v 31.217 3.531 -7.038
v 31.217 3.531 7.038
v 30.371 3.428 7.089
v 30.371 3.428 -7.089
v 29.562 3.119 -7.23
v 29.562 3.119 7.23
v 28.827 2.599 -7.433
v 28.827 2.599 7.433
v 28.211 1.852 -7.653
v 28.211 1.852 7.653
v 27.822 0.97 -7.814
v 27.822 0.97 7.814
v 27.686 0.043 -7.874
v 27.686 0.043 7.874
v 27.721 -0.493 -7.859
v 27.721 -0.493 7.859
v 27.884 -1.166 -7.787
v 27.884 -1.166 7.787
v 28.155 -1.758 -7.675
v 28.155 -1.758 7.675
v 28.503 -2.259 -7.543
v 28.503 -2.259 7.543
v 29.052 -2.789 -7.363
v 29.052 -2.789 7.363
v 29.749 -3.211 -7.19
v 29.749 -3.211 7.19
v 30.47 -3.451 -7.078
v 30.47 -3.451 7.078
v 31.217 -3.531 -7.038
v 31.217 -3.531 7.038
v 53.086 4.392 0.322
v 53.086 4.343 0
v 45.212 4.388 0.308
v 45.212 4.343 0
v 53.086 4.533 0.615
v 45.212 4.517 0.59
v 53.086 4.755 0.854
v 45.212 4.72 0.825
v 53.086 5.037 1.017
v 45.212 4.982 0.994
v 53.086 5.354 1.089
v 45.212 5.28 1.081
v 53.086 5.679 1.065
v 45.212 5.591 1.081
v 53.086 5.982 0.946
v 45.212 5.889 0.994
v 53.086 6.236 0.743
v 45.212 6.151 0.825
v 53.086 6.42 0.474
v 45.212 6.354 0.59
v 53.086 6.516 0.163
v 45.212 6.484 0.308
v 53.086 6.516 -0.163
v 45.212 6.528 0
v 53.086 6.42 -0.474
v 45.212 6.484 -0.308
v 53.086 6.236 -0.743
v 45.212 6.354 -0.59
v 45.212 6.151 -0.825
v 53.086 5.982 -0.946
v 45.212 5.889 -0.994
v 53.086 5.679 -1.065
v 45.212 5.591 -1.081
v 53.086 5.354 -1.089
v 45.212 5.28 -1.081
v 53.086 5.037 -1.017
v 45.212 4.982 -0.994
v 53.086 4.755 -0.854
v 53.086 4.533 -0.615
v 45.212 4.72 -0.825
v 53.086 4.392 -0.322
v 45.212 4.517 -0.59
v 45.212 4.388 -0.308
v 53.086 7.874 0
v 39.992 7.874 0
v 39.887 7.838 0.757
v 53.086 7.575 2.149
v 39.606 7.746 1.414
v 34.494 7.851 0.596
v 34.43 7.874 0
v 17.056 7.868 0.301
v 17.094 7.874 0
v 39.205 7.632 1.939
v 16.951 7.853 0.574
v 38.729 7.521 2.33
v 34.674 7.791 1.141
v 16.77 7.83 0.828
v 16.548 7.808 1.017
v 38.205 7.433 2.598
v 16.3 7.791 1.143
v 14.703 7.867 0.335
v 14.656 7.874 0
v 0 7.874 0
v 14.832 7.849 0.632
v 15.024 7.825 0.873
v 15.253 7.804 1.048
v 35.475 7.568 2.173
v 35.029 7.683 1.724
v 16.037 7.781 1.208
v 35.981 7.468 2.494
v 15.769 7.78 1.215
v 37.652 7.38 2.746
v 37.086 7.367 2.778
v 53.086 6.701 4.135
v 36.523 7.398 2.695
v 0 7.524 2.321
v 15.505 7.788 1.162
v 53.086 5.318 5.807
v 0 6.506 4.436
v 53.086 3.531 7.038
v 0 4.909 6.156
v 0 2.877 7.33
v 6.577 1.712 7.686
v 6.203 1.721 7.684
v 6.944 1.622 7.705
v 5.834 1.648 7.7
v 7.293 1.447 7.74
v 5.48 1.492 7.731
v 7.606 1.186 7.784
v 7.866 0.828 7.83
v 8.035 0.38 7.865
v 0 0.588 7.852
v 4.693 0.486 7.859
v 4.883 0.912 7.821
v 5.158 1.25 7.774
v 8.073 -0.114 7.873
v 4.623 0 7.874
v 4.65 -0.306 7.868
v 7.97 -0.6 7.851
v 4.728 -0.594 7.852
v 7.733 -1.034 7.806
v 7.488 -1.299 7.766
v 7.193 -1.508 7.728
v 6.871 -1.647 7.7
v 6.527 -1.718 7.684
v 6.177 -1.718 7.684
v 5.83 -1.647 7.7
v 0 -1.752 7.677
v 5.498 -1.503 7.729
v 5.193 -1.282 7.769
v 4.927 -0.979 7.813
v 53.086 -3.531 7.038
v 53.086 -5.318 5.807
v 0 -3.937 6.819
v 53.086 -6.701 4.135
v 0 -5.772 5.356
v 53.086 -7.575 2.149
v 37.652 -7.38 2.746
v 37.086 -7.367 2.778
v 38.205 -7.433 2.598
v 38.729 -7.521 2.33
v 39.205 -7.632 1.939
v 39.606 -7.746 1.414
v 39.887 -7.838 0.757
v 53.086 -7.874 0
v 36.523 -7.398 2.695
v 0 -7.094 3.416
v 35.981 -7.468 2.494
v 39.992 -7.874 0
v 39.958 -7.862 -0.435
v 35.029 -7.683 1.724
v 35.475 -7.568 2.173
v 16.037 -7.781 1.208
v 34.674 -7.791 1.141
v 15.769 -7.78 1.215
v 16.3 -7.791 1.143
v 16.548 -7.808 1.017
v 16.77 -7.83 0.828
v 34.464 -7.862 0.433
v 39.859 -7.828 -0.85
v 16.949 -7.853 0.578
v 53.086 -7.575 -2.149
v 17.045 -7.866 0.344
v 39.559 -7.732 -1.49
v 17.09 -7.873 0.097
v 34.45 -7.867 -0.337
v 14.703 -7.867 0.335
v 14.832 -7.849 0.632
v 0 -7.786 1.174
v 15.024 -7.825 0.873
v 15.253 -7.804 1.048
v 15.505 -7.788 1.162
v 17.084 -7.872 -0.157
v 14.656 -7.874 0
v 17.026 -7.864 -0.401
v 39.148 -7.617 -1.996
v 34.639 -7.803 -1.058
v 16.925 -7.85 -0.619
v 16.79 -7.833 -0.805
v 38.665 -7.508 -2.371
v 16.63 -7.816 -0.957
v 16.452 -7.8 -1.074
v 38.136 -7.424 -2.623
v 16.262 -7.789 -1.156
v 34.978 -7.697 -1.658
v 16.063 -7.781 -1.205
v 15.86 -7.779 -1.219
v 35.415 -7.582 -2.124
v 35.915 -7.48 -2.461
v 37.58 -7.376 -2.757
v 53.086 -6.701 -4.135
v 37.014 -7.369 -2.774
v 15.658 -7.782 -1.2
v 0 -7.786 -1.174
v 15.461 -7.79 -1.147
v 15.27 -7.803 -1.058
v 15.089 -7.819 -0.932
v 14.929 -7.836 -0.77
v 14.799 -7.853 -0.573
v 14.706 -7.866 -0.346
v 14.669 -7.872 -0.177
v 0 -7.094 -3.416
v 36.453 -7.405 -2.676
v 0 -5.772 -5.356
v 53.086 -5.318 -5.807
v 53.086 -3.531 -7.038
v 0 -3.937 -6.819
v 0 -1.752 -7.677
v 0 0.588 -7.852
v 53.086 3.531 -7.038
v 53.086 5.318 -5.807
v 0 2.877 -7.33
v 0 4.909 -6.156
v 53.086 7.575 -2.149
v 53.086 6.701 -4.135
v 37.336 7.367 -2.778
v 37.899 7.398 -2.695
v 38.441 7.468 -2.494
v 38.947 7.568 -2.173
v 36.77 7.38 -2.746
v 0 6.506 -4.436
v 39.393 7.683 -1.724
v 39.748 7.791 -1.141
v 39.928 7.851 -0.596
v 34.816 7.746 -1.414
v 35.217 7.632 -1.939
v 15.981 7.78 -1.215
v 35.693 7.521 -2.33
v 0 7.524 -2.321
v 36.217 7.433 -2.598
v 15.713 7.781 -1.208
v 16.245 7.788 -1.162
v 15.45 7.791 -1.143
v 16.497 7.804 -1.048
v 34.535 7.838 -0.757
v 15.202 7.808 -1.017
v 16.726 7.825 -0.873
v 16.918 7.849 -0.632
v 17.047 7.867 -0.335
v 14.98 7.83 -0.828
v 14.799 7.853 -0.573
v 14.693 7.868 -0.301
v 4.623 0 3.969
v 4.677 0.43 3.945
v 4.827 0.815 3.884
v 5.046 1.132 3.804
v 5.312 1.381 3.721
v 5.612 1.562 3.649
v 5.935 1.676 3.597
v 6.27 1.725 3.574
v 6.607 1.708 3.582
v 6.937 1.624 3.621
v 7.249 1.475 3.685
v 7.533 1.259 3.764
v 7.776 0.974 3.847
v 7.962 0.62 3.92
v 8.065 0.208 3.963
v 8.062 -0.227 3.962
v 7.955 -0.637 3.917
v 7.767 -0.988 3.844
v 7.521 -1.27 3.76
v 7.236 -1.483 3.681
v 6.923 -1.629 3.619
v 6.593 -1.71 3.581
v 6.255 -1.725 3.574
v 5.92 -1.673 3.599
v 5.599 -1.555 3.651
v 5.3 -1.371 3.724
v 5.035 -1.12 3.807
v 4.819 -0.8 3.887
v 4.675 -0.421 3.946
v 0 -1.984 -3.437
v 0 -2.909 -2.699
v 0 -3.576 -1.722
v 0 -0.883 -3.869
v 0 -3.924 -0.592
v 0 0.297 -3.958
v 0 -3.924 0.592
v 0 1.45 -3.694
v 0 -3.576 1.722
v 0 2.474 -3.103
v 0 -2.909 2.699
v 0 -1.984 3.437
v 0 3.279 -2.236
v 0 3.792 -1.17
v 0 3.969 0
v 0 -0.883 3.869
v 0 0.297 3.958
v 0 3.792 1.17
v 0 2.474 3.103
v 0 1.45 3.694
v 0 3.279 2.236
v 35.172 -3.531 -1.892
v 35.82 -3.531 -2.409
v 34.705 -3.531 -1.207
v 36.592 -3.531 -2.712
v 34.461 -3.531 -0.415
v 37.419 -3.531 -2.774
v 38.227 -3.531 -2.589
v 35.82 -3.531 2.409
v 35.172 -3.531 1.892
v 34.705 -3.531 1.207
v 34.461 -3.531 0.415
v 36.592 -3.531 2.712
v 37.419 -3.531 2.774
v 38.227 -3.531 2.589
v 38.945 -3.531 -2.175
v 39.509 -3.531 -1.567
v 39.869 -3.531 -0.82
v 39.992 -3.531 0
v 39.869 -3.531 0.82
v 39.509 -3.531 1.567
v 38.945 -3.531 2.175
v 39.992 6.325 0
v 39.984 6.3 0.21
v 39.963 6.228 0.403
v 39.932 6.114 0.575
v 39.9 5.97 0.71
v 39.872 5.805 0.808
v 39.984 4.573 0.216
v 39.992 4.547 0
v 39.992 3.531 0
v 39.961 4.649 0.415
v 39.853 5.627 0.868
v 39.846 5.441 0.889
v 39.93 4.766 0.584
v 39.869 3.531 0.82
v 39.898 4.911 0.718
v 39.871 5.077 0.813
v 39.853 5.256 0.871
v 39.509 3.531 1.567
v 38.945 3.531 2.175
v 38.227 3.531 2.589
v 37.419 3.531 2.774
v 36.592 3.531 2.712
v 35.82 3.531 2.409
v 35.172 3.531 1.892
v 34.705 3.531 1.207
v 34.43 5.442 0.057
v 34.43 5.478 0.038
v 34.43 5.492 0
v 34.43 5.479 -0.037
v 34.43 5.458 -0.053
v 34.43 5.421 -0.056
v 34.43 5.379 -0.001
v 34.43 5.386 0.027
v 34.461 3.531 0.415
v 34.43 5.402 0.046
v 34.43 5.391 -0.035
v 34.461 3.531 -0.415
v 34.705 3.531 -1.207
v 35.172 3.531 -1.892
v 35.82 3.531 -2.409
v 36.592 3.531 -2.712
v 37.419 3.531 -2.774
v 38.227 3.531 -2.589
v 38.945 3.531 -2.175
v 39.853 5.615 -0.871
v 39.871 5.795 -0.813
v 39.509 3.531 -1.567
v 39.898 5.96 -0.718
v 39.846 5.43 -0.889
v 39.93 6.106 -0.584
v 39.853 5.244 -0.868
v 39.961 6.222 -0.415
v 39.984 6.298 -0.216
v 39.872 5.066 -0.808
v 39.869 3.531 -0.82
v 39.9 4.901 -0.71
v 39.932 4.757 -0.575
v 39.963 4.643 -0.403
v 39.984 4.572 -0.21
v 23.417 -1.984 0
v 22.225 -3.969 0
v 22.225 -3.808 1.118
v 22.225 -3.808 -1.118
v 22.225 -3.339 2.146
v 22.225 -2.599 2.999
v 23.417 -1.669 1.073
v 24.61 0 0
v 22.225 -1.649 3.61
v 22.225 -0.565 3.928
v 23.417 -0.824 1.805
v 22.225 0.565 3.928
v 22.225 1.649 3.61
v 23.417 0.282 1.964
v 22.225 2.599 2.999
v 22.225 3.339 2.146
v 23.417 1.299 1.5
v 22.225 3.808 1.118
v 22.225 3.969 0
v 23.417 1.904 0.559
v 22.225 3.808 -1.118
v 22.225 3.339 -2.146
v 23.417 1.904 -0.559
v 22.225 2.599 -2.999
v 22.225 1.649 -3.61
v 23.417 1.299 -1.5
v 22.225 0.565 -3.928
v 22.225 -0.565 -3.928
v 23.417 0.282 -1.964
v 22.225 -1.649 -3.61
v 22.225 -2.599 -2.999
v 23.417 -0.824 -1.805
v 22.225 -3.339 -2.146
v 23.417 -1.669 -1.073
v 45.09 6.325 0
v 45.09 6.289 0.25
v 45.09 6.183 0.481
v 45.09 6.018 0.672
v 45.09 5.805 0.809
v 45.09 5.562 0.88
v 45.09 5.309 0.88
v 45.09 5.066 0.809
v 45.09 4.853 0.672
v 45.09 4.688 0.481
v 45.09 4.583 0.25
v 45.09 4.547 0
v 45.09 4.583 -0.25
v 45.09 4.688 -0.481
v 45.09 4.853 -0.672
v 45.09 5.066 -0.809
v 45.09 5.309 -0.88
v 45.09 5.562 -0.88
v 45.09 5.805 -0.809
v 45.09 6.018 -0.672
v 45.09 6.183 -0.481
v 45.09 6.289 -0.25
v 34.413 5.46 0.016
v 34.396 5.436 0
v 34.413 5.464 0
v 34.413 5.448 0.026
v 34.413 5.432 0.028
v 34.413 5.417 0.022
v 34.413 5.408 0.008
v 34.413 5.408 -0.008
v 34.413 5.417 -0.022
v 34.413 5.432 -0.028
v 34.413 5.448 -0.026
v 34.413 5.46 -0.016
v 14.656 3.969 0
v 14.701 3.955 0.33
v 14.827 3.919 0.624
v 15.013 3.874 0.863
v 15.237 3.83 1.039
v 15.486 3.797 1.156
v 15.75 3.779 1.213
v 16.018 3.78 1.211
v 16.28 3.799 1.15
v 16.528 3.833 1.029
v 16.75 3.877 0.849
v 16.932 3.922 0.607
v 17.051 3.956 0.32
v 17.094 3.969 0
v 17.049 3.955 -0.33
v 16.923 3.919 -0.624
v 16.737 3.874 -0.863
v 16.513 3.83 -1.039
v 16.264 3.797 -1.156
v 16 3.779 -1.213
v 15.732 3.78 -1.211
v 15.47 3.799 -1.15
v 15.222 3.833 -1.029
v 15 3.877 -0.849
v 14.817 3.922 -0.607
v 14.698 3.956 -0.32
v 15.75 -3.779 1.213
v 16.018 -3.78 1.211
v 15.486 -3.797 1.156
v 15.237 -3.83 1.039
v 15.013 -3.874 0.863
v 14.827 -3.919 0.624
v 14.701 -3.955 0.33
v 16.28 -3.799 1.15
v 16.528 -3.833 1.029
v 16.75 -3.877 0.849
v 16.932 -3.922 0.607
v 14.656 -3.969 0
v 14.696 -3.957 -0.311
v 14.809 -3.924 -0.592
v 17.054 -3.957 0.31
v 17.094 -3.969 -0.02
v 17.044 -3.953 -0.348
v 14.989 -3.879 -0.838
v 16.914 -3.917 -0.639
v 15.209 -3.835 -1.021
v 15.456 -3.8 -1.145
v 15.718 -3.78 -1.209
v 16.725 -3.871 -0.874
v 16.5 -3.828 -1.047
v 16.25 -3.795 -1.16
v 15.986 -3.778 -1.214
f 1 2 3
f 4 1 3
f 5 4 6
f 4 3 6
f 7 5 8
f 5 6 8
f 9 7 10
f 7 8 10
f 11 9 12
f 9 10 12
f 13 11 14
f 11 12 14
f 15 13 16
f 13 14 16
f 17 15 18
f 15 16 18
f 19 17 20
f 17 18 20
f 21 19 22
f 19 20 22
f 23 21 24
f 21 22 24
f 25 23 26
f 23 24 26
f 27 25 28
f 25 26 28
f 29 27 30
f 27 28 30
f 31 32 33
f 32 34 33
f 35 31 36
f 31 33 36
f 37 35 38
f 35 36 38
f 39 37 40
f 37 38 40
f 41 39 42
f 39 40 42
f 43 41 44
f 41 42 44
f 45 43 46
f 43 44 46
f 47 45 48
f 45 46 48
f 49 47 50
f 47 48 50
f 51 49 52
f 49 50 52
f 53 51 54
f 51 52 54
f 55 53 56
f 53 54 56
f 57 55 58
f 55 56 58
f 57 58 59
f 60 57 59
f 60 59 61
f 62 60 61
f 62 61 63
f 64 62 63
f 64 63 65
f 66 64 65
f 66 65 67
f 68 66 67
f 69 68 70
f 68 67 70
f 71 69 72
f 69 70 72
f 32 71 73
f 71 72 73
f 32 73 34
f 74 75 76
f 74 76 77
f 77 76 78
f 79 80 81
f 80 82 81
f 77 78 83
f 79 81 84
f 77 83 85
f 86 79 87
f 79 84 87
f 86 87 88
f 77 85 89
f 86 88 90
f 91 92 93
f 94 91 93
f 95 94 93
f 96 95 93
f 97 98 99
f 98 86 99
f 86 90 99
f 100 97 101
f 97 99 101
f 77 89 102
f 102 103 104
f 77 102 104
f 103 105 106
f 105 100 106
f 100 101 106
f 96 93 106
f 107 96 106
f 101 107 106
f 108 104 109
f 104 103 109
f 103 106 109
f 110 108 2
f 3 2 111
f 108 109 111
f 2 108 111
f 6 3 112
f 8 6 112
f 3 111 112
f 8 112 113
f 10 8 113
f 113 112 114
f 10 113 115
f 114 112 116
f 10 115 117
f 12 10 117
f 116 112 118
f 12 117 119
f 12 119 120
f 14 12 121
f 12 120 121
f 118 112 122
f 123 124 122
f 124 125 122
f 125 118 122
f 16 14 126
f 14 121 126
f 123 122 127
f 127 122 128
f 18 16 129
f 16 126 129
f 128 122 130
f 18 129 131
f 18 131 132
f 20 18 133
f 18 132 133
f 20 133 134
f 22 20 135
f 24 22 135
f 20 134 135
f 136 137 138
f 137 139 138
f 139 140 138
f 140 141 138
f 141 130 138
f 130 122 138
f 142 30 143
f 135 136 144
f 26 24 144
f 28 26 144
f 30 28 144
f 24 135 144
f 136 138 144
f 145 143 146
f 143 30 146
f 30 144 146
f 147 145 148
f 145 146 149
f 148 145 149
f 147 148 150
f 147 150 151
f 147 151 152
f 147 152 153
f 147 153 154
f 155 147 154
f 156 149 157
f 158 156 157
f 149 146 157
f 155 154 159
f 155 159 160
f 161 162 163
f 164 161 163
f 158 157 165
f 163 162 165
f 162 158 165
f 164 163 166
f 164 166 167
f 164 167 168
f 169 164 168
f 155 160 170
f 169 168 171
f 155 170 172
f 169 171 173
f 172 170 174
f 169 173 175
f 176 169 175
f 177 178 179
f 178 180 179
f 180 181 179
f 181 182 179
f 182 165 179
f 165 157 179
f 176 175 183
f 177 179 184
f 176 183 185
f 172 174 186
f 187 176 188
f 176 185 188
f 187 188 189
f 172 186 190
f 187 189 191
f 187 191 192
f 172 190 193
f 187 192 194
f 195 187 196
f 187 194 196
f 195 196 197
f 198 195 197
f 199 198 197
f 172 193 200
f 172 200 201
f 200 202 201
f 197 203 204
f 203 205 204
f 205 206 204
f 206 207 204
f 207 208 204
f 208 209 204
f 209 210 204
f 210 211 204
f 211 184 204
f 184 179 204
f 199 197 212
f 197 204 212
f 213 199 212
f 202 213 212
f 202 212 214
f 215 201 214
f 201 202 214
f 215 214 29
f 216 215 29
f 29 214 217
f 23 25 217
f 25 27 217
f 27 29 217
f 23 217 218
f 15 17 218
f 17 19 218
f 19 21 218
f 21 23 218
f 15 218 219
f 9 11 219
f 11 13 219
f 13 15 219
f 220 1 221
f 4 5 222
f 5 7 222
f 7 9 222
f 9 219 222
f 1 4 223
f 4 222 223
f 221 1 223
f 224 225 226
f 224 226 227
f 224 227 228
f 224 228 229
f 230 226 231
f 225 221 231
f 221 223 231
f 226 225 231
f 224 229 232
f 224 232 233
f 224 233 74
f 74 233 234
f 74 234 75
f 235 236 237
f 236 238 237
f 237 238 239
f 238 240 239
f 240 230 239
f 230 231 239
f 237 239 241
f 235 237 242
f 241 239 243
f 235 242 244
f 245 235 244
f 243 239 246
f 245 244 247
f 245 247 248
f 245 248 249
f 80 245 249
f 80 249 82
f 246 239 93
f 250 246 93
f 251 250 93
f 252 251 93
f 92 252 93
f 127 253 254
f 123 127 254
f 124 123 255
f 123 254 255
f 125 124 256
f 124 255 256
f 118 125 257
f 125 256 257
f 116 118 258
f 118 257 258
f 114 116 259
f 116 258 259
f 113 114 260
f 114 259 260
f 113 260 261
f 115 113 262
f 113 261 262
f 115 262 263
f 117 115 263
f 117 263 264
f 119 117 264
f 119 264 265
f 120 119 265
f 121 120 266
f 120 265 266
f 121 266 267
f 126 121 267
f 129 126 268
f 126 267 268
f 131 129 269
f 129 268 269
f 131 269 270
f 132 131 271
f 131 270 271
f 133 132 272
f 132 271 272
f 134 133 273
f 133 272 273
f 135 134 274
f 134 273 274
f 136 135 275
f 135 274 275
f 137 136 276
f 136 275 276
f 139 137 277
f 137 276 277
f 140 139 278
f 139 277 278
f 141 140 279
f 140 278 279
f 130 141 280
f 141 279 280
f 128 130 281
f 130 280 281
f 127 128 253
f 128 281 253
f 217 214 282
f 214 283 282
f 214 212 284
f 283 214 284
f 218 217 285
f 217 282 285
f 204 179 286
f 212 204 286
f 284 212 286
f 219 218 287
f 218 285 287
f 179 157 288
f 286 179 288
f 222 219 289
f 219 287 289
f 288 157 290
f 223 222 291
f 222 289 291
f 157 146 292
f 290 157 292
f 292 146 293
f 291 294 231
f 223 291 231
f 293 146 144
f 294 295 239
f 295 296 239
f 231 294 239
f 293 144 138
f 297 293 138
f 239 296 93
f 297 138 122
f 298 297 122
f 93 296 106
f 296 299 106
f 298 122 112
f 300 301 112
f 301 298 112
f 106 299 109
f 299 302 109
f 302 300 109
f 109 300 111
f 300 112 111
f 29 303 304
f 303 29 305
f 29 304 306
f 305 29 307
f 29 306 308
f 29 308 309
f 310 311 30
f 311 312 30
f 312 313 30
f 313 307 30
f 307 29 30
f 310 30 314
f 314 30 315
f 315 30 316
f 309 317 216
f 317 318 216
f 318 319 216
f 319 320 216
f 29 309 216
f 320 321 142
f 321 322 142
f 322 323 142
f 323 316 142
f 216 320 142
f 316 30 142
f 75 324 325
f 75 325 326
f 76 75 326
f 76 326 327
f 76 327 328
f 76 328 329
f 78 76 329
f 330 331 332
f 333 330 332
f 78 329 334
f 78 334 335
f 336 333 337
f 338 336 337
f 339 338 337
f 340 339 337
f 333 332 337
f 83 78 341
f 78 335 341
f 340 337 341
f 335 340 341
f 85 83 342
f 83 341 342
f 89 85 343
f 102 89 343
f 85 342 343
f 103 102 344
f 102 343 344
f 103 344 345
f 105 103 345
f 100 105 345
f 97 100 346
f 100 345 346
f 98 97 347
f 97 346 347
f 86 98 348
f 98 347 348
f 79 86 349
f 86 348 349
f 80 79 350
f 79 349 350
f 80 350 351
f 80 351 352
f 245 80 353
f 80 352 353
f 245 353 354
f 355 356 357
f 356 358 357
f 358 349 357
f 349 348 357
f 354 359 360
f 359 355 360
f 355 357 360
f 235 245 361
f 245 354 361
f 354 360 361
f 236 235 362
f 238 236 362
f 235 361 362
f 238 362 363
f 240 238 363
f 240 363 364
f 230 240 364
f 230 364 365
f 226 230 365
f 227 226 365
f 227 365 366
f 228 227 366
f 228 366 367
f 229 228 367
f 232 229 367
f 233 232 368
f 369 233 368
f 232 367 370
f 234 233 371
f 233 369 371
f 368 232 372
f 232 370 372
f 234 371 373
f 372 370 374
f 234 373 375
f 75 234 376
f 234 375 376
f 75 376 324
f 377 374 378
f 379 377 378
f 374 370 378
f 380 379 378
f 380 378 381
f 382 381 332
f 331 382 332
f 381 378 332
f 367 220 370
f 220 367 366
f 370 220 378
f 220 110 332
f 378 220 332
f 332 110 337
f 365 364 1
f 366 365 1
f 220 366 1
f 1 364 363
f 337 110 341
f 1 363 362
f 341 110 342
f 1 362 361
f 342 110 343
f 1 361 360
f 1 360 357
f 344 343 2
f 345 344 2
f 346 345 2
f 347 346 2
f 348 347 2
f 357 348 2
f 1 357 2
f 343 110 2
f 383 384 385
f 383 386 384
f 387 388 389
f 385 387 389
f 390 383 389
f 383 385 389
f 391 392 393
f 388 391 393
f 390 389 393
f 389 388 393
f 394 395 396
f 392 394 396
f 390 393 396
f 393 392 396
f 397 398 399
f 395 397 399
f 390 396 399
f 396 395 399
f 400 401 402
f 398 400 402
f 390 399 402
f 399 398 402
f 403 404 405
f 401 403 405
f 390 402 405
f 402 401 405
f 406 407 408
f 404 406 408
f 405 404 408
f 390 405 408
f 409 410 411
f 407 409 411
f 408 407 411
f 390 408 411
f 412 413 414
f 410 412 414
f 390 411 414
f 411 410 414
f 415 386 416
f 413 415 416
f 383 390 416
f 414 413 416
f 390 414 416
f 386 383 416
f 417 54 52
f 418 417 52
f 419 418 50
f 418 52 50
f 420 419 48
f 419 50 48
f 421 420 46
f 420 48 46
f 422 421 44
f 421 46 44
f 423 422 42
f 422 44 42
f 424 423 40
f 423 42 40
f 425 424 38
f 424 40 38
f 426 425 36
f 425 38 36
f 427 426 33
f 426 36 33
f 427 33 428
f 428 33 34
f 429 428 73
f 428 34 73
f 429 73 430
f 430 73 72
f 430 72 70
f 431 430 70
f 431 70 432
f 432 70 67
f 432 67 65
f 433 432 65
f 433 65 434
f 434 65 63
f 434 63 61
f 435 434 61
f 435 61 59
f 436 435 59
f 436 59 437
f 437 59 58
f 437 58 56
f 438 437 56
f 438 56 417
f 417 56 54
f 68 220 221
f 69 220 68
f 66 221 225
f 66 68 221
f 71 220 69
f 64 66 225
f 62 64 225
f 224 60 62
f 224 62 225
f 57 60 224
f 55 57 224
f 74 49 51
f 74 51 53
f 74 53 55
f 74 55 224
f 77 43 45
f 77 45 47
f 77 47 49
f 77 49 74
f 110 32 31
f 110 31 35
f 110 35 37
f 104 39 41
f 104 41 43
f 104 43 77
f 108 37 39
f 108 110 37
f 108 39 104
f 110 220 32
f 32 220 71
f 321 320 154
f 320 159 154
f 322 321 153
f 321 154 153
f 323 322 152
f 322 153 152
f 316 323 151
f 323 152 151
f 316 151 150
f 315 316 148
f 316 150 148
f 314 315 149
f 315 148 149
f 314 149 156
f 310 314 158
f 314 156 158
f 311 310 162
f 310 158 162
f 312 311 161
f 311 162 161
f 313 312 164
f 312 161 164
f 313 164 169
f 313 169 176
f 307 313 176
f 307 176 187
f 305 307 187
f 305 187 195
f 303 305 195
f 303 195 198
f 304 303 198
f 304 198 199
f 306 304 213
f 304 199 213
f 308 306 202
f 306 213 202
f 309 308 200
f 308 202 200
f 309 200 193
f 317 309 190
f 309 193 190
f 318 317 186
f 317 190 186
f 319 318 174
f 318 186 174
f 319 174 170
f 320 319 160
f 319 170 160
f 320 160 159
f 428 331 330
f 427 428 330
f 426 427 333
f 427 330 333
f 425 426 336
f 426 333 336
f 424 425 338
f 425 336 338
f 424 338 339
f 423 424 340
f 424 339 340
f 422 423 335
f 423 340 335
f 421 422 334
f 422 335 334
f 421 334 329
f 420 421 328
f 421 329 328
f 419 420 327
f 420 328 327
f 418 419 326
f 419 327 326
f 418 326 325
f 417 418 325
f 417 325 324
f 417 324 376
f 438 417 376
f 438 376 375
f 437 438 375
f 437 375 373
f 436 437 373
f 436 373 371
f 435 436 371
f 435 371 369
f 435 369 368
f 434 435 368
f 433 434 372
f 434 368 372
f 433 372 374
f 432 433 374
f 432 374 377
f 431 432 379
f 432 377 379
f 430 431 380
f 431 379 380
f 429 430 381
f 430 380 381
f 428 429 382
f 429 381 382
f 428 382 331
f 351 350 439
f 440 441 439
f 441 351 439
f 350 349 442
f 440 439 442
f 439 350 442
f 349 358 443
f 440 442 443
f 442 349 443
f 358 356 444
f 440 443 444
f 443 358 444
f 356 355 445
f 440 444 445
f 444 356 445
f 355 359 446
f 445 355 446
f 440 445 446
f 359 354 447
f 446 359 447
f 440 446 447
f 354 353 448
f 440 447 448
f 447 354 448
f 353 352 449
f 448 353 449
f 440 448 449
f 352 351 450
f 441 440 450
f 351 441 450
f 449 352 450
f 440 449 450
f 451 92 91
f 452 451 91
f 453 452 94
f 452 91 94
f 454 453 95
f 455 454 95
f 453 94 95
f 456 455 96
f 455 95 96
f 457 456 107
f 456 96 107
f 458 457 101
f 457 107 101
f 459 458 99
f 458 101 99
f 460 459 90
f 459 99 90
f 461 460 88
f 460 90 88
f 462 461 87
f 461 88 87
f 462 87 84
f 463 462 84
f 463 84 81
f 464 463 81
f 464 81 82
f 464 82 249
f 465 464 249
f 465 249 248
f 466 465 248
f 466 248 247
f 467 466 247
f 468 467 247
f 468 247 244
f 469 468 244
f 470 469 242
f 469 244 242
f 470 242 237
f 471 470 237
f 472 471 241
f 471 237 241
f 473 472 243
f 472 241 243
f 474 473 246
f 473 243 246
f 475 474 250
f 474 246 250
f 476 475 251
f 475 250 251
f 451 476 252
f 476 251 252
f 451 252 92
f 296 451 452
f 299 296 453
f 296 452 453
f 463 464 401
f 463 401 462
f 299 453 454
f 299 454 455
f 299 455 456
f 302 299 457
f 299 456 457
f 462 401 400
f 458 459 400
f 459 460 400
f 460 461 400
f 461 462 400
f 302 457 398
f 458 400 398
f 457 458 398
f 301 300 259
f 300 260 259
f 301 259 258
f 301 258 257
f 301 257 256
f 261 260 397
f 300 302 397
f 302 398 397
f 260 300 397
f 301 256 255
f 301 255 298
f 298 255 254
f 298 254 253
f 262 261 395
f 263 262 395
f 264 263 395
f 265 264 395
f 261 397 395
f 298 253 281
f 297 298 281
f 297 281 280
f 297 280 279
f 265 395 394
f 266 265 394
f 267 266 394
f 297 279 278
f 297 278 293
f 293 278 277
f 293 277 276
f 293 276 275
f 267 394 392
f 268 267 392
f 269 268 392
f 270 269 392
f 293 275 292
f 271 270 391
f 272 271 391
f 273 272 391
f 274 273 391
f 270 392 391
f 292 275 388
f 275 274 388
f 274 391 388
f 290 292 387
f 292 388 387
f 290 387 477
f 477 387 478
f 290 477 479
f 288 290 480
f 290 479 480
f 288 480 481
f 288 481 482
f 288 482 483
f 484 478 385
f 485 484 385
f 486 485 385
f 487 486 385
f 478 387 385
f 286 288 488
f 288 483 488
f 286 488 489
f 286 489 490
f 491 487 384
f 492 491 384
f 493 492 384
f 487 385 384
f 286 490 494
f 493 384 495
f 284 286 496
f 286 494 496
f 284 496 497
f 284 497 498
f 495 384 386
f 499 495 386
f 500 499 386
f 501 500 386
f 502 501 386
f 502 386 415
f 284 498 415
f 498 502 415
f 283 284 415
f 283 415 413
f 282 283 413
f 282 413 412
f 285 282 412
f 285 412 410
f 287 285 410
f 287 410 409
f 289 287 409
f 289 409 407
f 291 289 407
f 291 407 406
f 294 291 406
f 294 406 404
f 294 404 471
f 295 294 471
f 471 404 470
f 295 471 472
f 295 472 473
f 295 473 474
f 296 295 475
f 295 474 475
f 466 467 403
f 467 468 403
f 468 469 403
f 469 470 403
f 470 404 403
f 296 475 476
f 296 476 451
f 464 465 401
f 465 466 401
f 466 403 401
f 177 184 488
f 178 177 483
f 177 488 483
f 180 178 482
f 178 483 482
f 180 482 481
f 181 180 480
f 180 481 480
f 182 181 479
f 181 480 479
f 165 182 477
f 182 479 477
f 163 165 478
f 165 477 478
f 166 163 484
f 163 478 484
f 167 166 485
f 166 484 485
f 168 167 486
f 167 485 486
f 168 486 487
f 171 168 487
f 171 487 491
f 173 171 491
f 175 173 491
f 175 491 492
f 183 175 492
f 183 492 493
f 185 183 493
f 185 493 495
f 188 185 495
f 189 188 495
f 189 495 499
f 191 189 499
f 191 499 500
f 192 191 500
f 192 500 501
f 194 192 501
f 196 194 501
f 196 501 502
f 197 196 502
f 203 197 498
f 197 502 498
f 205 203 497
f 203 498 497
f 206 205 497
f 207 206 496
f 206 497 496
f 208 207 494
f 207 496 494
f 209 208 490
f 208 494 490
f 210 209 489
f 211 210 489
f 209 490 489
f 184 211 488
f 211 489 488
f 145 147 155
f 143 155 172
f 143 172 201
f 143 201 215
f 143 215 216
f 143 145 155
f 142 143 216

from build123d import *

# Parameters (mm, degrees)
F0_R      = 7.874
F1_DEPTH  = 53.086
F3_DEPTH  = 12.7
F6_D      = 3.4544
F6_DEPTH  = 7.71525
F6_START  = 4.2557702
F6_TIP    = 1.0378064612
F8_D      = 7.9375
F8_DEPTH  = 22.225
F8_TIP    = 2.3846655818
F9_R      = 2.7813
F10_DEPTH = 12.7
F13_D     = 2.4384
F15_D     = 2.1844
F15_DEPTH = 7.874
F15_TIP   = 0.6562599681
F16_D     = 1.778
F16_DEPTH = 10.16
F16_START = 7.9960949
F16_TIP   = 0.5341650903


with BuildPart() as f1:
    # F0 (on Right) → F1 (new body)
    with BuildSketch(Plane.YZ):
        Circle(F0_R)
    extrude(amount=F1_DEPTH)

    # F2 (on Top) → F3 (cut, symmetric)
    with BuildSketch(Plane.XY):
        with BuildLine():
            ThreePointArc((31.2166, 3.5306), (27.686, 0), (31.2166, -3.5306))
            Line((31.2166, -3.5306), (67.7581354976, -3.5306))
            Line((67.7581354976, -3.5306), (67.7581354976, 3.5306))
            Line((67.7581354976, 3.5306), (31.2166, 3.5306))
        make_face()
    extrude(amount=F3_DEPTH, both=True, mode=Mode.SUBTRACT)

    # F6
    # its depths count from where the whole tool has entered the part; down to there all is cleared
    with Locations(Plane.XY.offset(11.938).offset(-F6_START)):
        with Locations((6.35, 0)):
            Hole(F6_D / 2, depth=F6_DEPTH)
            with Locations((0, 0, -(F6_DEPTH + F6_TIP / 2))):  # 118° drill point
                Cone(0, F6_D / 2, F6_TIP, mode=Mode.SUBTRACT)

    # F8
    with Locations(Plane(origin=(0, 0, 0), x_dir=(0, -1, 0), z_dir=(-1, 0, 0))):
        with Locations((0, 0)):
            Hole(F8_D / 2, depth=F8_DEPTH)
            with Locations((0, 0, -(F8_DEPTH + F8_TIP / 2))):  # 118° drill point
                Cone(0, F8_D / 2, F8_TIP, mode=Mode.SUBTRACT)

    # F9 (on Front) → F10 (cut, symmetric)
    with BuildSketch(Plane.XZ):
        with Locations((37.211, 0)):
            Circle(F9_R)
    extrude(amount=F10_DEPTH, both=True, mode=Mode.SUBTRACT)

    # F13 (through all)
    with Locations(Plane.XZ.offset(12.7)):
        with Locations((15.875, 0)):
            Hole(F13_D / 2)

    # F15
    with Locations(Plane.YZ.offset(53.086)):
        with Locations((5.4356, 0)):
            Hole(F15_D / 2, depth=F15_DEPTH)
            with Locations((0, 0, -(F15_DEPTH + F15_TIP / 2))):  # 118° drill point
                Cone(0, F15_D / 2, F15_TIP, mode=Mode.SUBTRACT)

    # F16
    # its depths count from where the whole tool has entered the part; down to there all is cleared
    with Locations(Plane.YZ.offset(53.086).offset(-F16_START)):
        with Locations((5.4356, 0)):
            Hole(F16_D / 2, depth=F16_DEPTH)
            with Locations((0, 0, -(F16_DEPTH + F16_TIP / 2))):  # 118° drill point
                Cone(0, F16_D / 2, F16_TIP, mode=Mode.SUBTRACT)


solid = f1.part
